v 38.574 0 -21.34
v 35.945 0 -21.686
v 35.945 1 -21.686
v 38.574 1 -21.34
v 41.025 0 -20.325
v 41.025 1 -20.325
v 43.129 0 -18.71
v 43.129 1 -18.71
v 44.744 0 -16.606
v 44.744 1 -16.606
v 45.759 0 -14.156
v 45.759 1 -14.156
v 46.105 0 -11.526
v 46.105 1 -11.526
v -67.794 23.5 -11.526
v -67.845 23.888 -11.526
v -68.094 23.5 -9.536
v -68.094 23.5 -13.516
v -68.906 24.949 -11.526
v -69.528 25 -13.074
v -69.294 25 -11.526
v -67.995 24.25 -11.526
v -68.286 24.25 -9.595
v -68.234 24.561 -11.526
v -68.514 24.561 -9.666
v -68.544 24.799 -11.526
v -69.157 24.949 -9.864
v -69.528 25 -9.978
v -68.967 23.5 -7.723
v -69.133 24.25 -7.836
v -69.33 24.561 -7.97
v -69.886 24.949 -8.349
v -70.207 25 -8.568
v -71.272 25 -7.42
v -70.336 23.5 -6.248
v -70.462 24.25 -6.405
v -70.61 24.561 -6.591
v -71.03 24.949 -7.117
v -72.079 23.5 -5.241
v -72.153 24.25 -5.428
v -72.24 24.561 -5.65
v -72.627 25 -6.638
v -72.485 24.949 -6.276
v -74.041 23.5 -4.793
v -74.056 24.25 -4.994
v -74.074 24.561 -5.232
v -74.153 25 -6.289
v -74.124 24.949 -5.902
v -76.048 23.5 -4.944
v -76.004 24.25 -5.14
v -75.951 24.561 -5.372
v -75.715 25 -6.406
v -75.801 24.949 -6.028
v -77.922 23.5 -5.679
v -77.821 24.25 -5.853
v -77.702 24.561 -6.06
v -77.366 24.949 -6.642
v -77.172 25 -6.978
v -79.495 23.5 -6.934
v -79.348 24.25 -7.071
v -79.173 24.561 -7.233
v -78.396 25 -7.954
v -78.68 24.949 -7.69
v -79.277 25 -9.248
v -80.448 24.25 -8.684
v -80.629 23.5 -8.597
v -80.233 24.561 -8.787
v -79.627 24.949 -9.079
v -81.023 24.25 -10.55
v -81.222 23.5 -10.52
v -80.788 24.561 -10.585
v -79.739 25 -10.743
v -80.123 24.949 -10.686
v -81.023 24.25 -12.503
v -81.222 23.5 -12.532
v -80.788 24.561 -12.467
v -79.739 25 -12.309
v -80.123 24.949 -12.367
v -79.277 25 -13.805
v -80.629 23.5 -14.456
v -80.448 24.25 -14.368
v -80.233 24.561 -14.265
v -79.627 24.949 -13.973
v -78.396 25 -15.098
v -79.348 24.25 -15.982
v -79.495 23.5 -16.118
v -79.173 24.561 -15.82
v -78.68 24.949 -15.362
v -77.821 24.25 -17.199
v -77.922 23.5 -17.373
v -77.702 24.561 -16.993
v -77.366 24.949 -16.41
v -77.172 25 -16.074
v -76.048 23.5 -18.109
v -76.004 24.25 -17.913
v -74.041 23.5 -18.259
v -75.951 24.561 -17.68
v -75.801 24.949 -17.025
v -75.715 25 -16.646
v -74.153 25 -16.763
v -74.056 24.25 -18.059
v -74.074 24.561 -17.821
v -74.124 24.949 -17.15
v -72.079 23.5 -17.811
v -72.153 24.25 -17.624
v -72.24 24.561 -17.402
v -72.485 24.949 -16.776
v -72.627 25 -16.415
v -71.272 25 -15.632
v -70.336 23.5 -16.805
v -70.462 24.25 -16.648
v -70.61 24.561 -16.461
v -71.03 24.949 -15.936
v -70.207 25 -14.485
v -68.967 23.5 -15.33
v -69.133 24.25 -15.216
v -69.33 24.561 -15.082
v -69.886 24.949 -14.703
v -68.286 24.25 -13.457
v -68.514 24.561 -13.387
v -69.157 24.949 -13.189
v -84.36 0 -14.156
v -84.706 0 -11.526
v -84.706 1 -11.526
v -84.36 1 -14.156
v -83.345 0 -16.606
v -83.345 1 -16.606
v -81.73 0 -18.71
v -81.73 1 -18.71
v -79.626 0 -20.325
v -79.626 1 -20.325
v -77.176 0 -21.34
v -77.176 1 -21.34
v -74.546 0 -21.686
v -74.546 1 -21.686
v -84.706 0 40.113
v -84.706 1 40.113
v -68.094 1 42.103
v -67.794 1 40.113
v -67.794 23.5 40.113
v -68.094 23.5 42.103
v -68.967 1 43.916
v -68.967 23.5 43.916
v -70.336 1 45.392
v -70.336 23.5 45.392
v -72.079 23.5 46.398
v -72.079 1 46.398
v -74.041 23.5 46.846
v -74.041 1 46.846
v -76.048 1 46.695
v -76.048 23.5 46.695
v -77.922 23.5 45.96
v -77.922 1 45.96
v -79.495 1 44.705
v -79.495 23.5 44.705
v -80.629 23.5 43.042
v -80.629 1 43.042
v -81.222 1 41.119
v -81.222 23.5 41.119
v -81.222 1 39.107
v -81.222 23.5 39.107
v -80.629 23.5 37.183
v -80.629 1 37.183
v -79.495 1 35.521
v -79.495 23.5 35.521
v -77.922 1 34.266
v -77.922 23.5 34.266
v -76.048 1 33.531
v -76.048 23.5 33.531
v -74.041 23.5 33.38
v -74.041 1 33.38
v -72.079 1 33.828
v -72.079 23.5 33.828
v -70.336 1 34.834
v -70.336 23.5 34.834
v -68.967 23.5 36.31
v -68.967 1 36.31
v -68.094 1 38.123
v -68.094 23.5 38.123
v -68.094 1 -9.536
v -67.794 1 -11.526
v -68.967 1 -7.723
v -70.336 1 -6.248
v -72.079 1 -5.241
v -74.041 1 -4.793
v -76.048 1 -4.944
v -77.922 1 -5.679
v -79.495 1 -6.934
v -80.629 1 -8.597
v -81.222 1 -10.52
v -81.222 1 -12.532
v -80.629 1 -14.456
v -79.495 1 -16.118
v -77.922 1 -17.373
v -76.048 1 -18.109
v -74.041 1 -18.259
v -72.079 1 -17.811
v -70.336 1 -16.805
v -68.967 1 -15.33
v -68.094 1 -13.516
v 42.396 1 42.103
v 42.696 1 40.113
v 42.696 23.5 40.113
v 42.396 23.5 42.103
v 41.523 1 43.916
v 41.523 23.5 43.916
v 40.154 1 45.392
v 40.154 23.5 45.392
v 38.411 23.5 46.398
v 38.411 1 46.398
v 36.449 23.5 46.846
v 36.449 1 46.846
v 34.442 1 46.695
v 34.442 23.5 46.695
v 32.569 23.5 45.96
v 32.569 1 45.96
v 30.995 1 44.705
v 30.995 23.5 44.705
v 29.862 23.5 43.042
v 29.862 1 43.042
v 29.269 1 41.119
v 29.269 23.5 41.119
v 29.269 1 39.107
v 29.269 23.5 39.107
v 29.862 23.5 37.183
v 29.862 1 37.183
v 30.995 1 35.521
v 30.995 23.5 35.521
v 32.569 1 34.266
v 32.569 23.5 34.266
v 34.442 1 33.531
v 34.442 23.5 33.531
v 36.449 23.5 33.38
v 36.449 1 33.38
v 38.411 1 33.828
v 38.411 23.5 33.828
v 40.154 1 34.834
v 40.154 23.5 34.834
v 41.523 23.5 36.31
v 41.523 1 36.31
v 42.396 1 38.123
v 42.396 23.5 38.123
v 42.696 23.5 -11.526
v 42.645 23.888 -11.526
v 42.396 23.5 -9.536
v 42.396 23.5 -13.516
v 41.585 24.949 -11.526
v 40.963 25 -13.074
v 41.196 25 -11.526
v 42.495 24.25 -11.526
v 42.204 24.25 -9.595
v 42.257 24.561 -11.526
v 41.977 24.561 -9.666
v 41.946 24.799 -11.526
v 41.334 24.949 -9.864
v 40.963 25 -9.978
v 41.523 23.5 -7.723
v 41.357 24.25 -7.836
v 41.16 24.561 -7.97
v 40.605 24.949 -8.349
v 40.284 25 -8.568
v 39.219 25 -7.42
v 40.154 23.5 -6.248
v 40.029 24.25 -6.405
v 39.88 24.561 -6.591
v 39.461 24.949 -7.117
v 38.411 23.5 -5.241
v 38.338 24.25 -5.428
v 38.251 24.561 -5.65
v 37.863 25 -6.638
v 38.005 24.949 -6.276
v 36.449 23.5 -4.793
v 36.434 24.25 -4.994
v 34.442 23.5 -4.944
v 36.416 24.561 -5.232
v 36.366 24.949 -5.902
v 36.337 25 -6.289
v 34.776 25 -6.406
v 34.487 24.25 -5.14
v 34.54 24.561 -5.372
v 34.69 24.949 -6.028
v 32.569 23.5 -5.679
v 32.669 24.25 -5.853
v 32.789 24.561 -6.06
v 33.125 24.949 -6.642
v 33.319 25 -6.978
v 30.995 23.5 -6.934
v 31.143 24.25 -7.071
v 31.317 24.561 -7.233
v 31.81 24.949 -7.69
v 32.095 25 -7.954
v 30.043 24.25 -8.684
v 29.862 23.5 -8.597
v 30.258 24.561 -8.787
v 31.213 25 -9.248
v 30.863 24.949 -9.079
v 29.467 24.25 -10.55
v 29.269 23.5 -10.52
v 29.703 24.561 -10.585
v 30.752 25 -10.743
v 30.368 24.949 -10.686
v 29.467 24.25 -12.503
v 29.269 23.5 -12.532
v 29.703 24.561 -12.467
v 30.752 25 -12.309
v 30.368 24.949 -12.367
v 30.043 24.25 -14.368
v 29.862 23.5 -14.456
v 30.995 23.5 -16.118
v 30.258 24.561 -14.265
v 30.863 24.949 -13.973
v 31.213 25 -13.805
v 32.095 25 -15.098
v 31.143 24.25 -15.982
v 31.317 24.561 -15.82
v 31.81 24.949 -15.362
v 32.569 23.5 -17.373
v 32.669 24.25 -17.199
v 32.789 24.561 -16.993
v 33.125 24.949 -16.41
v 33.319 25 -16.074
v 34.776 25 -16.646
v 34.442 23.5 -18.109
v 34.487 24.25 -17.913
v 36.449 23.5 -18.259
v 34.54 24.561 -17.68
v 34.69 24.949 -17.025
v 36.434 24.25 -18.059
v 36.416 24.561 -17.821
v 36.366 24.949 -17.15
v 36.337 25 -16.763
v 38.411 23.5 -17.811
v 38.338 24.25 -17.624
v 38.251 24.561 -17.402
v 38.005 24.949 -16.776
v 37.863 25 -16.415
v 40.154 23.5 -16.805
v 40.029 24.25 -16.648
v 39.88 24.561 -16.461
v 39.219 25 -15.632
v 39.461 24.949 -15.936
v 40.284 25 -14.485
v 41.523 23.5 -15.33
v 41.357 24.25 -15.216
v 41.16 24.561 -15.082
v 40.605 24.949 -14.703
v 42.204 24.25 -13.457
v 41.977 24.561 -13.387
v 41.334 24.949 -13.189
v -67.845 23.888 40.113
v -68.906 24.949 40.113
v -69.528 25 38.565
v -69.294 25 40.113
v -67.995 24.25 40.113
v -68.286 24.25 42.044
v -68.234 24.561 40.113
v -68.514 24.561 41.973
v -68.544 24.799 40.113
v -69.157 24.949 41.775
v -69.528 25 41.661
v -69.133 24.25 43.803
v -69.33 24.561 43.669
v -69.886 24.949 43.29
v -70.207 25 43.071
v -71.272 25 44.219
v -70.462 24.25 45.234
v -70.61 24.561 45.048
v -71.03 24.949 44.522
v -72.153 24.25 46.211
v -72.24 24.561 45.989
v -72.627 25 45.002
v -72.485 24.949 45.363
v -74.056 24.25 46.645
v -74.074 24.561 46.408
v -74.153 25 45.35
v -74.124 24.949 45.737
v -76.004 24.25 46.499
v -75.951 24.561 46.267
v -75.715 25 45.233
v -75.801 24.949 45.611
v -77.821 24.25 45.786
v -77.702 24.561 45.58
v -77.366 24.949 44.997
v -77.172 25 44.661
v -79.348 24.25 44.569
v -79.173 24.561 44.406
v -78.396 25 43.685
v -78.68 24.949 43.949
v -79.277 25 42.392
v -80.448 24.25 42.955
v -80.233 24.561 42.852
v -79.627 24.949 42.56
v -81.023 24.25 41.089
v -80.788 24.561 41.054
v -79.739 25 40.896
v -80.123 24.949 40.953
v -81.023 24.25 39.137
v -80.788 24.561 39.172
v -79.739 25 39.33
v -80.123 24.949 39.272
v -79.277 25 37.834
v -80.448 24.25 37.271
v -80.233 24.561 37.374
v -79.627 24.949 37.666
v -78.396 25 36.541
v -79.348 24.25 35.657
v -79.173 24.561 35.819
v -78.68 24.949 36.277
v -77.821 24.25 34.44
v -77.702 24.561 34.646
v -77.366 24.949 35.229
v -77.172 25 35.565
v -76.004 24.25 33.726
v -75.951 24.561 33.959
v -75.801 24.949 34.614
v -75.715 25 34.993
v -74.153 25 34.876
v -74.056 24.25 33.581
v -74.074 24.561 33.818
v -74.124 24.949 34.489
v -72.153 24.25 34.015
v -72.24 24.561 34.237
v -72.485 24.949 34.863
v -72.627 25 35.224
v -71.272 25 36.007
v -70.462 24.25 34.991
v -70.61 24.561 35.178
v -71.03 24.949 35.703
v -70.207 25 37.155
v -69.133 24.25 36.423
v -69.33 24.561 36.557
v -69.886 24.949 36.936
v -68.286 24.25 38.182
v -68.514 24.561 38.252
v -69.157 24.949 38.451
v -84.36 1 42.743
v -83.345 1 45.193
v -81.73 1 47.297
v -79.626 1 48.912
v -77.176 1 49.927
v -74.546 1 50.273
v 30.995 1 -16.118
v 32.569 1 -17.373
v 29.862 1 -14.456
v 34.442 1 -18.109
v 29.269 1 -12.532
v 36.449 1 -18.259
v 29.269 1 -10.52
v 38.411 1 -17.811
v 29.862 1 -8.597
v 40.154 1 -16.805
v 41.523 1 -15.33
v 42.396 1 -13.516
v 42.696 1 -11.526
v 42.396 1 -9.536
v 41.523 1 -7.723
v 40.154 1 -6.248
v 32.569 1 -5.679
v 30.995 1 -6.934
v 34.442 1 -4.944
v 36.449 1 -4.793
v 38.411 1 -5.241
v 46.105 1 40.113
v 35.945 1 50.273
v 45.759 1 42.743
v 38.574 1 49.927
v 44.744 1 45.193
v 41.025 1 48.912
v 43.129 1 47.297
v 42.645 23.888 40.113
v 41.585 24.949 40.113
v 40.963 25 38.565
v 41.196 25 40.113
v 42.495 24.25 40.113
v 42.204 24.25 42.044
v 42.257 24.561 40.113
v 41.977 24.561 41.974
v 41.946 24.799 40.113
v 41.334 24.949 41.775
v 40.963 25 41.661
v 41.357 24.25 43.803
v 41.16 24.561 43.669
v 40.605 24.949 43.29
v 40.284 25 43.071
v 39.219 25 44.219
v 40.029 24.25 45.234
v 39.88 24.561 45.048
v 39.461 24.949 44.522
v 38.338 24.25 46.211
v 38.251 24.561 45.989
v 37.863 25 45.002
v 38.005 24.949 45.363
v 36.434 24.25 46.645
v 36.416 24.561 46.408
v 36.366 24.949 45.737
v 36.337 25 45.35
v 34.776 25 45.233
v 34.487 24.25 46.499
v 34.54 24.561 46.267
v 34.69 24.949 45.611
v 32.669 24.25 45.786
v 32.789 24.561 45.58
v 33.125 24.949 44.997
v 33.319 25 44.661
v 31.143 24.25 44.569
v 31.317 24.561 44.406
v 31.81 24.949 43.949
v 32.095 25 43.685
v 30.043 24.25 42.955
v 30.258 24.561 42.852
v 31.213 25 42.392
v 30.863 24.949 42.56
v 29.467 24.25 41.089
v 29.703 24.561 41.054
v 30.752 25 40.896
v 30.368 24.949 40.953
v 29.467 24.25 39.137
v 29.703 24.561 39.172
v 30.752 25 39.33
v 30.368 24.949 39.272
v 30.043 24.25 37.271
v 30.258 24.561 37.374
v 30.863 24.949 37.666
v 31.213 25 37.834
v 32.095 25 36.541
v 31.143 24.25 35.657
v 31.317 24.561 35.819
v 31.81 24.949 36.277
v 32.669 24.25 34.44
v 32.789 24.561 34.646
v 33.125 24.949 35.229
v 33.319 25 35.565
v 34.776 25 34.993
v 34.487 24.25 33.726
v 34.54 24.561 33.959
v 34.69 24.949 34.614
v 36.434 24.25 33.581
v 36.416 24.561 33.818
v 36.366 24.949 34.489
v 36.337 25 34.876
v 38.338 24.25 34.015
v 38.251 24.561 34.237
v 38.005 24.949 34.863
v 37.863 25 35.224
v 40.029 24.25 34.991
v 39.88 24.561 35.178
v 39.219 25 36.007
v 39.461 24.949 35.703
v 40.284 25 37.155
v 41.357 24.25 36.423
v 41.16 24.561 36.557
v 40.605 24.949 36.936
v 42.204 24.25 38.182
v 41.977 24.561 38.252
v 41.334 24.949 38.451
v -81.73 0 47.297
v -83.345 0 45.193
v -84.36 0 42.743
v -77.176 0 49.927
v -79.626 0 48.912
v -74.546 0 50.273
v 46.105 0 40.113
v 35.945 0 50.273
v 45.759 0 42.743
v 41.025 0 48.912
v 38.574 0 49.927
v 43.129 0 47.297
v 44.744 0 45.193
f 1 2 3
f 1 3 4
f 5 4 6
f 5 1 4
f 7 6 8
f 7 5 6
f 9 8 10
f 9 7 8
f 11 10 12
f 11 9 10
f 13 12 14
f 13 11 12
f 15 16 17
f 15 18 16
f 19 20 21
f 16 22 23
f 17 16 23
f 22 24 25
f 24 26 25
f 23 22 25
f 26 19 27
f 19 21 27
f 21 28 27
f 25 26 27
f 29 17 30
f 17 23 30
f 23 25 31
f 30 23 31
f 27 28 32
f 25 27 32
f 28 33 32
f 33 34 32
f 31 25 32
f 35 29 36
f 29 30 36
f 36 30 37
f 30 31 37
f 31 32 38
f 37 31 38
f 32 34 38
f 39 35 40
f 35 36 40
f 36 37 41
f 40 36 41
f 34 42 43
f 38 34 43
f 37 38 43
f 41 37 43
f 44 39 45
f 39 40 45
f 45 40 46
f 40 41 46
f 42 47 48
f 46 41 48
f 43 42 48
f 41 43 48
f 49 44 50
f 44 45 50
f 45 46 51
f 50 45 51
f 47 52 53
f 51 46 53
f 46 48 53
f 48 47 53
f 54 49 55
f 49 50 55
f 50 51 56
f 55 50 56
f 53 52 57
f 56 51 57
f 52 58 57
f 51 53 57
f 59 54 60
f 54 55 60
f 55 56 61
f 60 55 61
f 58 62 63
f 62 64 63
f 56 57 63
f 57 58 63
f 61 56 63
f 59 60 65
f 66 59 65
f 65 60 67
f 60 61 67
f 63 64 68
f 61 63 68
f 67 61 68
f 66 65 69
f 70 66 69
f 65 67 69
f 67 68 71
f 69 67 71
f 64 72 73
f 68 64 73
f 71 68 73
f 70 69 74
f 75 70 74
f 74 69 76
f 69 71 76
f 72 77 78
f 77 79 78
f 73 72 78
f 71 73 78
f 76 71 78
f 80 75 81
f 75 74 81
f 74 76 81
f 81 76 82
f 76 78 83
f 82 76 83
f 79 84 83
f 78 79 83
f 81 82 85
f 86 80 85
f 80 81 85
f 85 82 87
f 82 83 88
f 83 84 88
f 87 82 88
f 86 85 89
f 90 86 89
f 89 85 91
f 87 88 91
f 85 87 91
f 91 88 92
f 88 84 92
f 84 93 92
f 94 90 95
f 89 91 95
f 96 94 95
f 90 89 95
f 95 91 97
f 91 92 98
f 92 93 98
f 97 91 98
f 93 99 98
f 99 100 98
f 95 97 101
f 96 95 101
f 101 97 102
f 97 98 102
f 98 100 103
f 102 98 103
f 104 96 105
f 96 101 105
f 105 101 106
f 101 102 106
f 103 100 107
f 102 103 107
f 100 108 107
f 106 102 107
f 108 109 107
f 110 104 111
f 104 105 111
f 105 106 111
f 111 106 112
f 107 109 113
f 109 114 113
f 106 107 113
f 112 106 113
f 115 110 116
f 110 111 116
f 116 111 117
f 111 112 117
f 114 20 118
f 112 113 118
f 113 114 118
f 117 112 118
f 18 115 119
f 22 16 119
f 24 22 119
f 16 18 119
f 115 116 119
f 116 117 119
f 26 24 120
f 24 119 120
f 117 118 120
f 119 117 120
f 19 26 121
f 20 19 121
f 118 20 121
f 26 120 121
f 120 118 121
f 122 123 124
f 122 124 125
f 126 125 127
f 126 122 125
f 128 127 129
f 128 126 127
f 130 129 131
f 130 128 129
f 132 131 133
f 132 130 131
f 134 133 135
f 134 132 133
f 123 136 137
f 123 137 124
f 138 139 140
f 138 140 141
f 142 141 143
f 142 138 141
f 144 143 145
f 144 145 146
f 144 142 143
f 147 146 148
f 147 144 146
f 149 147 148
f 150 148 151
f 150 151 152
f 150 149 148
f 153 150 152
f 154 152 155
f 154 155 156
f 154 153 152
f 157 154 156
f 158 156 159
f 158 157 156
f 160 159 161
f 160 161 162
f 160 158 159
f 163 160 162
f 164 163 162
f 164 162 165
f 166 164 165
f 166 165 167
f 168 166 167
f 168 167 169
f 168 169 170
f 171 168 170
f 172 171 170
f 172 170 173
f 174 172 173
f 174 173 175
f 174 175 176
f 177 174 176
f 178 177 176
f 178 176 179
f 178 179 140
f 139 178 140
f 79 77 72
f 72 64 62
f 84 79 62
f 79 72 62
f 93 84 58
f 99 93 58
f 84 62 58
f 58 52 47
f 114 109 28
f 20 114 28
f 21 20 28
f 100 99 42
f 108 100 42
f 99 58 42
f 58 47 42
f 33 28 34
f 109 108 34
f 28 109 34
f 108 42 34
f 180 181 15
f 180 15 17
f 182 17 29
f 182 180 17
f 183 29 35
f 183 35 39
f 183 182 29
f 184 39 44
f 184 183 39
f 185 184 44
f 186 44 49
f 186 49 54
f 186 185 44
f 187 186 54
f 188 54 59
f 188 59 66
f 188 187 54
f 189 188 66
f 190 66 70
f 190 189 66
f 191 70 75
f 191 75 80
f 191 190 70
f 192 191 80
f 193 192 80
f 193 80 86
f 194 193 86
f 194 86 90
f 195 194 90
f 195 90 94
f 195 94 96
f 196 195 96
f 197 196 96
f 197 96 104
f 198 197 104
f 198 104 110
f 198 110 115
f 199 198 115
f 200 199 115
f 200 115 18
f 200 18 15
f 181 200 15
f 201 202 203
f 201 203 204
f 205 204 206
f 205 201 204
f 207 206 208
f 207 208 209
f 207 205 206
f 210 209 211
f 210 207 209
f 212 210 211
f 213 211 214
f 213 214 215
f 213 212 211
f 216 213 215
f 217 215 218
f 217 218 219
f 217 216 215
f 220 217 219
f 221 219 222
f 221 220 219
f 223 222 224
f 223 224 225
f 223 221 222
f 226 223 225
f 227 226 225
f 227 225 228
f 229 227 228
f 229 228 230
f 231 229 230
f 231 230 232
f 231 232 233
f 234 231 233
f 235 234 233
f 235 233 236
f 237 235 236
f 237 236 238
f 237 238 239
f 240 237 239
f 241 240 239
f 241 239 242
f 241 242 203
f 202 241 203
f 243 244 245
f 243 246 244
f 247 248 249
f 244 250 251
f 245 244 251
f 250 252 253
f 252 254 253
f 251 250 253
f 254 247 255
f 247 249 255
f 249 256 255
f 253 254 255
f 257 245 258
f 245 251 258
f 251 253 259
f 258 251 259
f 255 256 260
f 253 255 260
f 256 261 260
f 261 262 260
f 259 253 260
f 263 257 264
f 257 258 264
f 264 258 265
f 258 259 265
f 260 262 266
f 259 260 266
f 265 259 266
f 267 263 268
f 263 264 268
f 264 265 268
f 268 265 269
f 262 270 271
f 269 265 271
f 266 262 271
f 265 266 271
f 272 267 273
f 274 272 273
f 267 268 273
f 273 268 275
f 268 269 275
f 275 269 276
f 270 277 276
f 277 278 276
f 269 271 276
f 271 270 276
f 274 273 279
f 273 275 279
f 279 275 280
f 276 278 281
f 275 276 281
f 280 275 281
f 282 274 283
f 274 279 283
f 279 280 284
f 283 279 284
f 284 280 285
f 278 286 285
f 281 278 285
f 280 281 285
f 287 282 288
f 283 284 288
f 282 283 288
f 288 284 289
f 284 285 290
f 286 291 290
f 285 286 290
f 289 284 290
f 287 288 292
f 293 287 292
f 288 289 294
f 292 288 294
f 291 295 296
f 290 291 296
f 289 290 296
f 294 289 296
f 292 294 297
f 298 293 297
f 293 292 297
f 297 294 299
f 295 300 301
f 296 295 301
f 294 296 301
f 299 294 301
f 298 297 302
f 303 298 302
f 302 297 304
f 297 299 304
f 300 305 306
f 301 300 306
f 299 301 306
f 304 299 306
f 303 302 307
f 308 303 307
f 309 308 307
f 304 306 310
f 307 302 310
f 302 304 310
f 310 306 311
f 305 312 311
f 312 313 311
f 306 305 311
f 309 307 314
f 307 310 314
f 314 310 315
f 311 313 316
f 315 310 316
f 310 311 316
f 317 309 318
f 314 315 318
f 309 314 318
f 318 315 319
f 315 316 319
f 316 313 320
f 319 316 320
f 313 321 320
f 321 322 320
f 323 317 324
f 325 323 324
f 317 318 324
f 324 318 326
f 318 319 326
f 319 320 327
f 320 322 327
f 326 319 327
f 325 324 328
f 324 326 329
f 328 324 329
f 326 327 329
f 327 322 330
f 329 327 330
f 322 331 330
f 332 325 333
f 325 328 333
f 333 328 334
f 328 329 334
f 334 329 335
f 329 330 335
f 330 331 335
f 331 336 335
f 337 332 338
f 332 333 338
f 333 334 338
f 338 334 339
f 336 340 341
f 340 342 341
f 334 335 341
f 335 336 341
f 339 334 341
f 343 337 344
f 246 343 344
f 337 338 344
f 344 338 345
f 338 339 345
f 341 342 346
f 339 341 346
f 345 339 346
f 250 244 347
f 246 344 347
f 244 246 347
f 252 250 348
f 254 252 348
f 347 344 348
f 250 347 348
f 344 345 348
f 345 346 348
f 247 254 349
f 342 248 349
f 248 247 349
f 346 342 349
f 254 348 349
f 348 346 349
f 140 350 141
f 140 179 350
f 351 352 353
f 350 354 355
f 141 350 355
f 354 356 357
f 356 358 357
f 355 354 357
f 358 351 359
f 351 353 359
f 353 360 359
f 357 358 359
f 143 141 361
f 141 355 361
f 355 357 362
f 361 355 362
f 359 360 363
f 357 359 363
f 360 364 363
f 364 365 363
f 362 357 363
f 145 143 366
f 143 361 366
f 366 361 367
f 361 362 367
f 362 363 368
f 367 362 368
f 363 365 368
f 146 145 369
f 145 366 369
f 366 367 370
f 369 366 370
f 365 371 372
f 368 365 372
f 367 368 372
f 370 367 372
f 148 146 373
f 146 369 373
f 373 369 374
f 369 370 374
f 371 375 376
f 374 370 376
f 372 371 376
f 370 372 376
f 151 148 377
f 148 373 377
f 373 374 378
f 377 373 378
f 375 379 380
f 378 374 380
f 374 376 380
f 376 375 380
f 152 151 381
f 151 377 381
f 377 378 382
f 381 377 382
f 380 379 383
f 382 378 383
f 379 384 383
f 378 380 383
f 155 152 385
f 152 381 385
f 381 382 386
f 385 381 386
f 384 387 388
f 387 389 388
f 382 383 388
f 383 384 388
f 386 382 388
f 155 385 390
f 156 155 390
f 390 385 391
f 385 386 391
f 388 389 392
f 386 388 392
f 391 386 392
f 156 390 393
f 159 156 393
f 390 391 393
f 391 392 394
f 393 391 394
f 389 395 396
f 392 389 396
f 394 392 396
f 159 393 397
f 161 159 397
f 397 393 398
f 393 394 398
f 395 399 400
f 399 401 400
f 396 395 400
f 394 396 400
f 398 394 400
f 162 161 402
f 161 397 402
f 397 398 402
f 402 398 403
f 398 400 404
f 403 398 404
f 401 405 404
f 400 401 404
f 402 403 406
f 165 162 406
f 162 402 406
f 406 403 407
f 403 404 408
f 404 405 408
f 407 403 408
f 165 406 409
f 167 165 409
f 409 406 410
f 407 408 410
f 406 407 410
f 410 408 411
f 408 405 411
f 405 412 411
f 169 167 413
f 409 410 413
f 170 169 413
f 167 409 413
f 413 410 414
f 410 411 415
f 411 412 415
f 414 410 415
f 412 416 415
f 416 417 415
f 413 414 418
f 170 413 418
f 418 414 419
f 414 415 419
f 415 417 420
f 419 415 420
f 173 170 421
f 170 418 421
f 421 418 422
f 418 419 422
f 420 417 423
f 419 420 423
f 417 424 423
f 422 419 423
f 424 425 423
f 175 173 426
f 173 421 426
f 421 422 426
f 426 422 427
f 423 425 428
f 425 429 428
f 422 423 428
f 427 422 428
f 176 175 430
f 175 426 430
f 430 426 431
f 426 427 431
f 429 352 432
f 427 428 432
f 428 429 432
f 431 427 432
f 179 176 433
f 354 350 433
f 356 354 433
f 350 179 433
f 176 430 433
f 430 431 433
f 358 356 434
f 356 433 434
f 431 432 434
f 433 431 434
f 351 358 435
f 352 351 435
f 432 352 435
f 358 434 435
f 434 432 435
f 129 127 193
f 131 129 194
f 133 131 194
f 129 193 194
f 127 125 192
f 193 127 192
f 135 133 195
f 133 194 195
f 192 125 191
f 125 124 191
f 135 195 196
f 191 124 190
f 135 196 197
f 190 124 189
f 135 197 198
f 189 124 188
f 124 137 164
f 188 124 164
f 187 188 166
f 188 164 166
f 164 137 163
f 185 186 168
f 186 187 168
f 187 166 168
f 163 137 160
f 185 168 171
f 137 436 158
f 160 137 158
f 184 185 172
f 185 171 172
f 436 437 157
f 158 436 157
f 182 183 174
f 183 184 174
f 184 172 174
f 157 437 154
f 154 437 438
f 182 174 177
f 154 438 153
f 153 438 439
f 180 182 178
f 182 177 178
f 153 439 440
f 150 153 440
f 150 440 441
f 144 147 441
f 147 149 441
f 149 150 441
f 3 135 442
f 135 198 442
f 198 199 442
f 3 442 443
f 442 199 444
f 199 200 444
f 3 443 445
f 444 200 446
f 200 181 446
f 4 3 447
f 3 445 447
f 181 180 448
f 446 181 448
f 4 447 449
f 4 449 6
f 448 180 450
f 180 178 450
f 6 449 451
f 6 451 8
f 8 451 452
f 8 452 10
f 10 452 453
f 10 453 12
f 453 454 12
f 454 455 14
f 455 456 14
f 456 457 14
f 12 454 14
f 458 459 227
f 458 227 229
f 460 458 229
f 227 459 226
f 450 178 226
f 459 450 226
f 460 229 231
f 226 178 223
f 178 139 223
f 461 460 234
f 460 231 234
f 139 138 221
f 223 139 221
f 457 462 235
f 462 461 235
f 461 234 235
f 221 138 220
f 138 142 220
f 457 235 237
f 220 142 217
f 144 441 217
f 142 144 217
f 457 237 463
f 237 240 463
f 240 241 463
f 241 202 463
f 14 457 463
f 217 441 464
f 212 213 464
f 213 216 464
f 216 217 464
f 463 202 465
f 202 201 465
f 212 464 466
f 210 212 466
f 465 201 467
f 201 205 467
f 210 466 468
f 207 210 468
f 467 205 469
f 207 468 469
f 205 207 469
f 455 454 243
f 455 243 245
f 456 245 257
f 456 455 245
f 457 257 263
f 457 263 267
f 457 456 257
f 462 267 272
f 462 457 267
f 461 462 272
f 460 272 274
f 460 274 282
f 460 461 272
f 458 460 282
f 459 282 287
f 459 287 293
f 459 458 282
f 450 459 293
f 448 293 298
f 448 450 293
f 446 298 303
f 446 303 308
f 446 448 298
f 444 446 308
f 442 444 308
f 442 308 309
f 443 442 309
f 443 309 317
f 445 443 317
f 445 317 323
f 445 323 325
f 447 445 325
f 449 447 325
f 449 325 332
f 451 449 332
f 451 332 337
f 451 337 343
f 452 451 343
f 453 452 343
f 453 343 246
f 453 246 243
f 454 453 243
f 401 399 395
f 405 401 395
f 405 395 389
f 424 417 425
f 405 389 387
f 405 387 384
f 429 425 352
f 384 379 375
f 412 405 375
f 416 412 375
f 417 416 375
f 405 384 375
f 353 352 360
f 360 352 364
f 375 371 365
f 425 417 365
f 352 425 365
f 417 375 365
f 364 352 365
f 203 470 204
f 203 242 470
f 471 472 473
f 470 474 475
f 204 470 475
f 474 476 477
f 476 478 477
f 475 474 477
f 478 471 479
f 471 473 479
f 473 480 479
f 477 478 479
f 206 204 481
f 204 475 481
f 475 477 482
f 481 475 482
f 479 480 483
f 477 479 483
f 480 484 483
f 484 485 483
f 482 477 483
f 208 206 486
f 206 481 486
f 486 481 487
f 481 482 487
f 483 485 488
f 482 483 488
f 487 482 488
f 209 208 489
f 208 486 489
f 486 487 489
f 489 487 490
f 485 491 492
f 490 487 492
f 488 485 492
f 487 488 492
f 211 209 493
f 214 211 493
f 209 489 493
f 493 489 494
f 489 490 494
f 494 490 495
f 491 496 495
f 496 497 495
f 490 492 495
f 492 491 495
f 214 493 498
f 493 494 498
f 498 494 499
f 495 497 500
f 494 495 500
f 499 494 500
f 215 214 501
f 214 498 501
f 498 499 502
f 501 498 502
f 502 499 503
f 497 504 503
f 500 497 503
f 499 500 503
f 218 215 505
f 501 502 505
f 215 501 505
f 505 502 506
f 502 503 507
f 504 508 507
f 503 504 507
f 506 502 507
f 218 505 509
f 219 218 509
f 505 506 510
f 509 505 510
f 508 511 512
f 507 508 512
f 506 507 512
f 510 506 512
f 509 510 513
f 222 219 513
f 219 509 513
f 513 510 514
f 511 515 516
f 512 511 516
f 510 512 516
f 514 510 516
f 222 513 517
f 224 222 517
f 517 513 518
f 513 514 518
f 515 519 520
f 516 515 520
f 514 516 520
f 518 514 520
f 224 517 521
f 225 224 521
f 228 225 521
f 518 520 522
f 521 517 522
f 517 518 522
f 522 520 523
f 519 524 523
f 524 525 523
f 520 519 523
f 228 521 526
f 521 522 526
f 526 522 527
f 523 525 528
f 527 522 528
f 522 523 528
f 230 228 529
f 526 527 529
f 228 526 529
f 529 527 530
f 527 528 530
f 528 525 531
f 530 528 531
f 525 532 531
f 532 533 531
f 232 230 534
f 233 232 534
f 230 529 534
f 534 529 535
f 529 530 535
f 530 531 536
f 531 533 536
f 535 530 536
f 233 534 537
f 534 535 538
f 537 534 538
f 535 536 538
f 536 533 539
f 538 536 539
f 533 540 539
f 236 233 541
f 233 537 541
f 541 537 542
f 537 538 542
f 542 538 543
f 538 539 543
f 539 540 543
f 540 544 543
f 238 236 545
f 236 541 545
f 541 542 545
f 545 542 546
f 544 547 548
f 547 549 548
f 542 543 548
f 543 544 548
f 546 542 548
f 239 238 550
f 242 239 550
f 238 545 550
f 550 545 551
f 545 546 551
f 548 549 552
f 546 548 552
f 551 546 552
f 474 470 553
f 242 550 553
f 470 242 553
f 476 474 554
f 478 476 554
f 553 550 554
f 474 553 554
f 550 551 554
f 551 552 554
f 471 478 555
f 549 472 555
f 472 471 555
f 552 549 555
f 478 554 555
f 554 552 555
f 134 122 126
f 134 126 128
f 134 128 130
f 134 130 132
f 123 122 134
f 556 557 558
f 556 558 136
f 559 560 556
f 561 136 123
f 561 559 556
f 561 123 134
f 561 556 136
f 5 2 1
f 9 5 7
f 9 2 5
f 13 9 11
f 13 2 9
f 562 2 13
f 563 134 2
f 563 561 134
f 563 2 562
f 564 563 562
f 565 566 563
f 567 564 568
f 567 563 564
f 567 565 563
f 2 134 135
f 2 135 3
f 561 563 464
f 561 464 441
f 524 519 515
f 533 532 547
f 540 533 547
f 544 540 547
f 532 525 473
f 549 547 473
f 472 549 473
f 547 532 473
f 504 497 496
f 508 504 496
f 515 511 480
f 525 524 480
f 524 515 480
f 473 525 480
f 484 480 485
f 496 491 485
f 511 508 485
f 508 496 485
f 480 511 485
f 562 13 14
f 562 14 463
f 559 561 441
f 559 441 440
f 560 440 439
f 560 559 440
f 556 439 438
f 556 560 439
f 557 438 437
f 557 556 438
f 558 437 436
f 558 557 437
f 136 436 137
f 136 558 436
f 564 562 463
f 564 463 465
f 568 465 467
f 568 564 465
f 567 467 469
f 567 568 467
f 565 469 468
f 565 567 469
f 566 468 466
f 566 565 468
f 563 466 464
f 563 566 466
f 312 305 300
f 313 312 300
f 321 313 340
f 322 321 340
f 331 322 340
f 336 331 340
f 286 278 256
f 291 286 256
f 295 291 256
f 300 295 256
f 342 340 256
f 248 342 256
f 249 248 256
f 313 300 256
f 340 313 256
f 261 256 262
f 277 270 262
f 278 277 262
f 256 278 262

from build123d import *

# Parameters (mm, degrees)
F0_R     = 6.751658
F1_DEPTH = 1
F2_DEPTH = 25
F3_R     = 1.5


with BuildPart() as f1:
    # F0 (on Front) → F1 (new body)
    with BuildSketch(Plane.XZ):
        with BuildLine():
            Line((-74.545912, -21.686205), (35.944755, -21.686205))
            ThreePointArc((35.944755, -21.686205), (43.12896, -18.71041), (46.104755, -11.526205))
            Line((46.104755, -11.526205), (46.104755, 40.112911))
            ThreePointArc((46.104755, 40.112911), (43.12896, 47.297116), (35.944755, 50.272911))
            Line((35.944755, 50.272911), (-74.545912, 50.272911))
            ThreePointArc((-74.545912, 50.272911), (-81.730116, 47.297116), (-84.705912, 40.112911))
            Line((-84.705912, 40.112911), (-84.705912, -11.526205))
            ThreePointArc((-84.705912, -11.526205), (-81.730116, -18.71041), (-74.545912, -21.686205))
        make_face()
        with Locations((-74.545912, -11.526205)):
            Circle(F0_R, mode=Mode.SUBTRACT)
        with Locations((35.944755, -11.526205)):
            Circle(F0_R, mode=Mode.SUBTRACT)
        with Locations((-74.545912, 40.112911)):
            Circle(F0_R, mode=Mode.SUBTRACT)
        with Locations((35.944755, 40.112912)):
            Circle(F0_R, mode=Mode.SUBTRACT)
    extrude(amount=-F1_DEPTH)

    # F0 (on Front) → F2 (join)
    with BuildSketch(Plane.XZ):
        with Locations((35.944755, 40.112912)):
            Circle(F0_R)
        with Locations((35.944755, -11.526205)):
            Circle(F0_R)
        with Locations((-74.545912, -11.526205)):
            Circle(F0_R)
        with Locations((-74.545912, 40.112911)):
            Circle(F0_R)
    extrude(amount=-F2_DEPTH)

    # F3
    f3_edges = [f1.edges().sort_by_distance(p)[0] for p in [
        (-81.29757, 25, 40.112911),
        (29.193097, 25, 40.112912),
        (29.193097, 25, -11.526205),
        (-81.29757, 25, -11.526205),
    ]]
    fillet(f3_edges, radius=F3_R)


solid = f1.part
